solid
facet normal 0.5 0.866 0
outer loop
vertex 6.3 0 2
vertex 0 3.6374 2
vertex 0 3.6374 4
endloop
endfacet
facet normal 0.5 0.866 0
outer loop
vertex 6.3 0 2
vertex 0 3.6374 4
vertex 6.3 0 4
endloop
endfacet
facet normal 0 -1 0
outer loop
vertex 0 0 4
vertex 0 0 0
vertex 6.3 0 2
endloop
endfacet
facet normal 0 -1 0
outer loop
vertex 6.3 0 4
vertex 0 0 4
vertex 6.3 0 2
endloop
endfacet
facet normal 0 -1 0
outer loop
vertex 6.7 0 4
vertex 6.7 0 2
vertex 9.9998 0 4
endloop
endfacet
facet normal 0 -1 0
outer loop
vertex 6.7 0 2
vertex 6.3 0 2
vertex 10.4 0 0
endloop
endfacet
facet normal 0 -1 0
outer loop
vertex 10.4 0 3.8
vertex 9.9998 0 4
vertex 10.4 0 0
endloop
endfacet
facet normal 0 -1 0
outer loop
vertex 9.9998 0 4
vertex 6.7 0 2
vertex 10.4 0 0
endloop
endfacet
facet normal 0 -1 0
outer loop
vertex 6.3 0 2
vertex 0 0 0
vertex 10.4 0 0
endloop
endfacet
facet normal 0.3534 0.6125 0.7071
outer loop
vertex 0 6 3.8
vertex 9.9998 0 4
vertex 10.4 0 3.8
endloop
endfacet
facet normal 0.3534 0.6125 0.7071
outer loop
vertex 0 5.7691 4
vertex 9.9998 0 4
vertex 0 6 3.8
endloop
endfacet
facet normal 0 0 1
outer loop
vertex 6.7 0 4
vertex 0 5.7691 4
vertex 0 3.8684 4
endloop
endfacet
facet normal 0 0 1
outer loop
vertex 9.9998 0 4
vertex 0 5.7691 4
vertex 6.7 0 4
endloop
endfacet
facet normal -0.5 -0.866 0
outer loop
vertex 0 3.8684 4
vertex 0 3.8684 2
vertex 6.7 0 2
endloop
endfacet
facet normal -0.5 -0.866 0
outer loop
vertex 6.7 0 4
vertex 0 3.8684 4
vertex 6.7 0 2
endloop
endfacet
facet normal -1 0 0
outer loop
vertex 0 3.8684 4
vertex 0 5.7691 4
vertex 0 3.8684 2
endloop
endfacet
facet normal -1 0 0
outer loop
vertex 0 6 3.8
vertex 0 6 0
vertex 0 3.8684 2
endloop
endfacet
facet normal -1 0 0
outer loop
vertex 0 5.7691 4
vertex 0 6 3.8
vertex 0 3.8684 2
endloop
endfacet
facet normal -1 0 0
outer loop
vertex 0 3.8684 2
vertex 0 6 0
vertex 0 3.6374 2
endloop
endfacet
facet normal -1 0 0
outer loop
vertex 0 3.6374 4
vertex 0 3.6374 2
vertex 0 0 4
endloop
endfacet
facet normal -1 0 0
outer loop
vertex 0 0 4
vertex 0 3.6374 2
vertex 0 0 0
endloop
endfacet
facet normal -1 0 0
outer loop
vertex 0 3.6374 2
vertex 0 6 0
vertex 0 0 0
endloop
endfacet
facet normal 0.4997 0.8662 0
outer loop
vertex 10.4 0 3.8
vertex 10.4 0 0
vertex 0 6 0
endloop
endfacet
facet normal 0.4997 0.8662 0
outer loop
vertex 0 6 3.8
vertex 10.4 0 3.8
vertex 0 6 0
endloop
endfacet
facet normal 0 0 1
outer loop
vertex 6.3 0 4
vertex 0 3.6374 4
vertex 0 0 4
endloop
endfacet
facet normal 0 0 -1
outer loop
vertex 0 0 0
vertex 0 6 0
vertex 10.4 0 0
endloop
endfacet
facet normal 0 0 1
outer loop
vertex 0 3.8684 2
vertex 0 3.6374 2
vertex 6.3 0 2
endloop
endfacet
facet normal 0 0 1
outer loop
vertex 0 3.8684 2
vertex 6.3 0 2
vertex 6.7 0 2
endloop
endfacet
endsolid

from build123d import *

# Parameters (mm, degrees)
BOSS_EXTRUDE1_DEPTH  = 4
CUT_SWEEP1_START     = 3.150069302
CUT_SWEEP1_OUTLINE_W = 8
CUT_SWEEP1_OUTLINE_H = 2
CUT_SWEEP1_DEPTH     = 0.2000044
CHAMFER1_SIZE        = 0.2


# Read off the part's stored shape, not the designer's step: Cut-Sweep1
with BuildPart() as part:
    # Sketch1 → Boss-Extrude1 (new body)
    with BuildSketch(Plane.XY):
        Polygon((0, 0), (10.4, 0), (0, 6), align=None)
    extrude(amount=BOSS_EXTRUDE1_DEPTH)

    # Cut-Sweep1 outline → Cut-Sweep1 (cut)
    with BuildSketch(Plane(origin=(0, 0, 0), x_dir=(0.866019052628739, -0.5000110003630132, 0), z_dir=(0.5000110003630132, 0.8660190526287392, 0)).offset(CUT_SWEEP1_START)):
        with Locations((2, -3)):
            Rectangle(CUT_SWEEP1_OUTLINE_W, CUT_SWEEP1_OUTLINE_H)
    extrude(amount=CUT_SWEEP1_DEPTH, mode=Mode.SUBTRACT)

    # Chamfer1
    chamfer1_edges = [part.edges().sort_by_distance(p)[0] for p in [
        (5.2, 3, 4),
    ]]
    chamfer(chamfer1_edges, length=CHAMFER1_SIZE)


solid = part.part
